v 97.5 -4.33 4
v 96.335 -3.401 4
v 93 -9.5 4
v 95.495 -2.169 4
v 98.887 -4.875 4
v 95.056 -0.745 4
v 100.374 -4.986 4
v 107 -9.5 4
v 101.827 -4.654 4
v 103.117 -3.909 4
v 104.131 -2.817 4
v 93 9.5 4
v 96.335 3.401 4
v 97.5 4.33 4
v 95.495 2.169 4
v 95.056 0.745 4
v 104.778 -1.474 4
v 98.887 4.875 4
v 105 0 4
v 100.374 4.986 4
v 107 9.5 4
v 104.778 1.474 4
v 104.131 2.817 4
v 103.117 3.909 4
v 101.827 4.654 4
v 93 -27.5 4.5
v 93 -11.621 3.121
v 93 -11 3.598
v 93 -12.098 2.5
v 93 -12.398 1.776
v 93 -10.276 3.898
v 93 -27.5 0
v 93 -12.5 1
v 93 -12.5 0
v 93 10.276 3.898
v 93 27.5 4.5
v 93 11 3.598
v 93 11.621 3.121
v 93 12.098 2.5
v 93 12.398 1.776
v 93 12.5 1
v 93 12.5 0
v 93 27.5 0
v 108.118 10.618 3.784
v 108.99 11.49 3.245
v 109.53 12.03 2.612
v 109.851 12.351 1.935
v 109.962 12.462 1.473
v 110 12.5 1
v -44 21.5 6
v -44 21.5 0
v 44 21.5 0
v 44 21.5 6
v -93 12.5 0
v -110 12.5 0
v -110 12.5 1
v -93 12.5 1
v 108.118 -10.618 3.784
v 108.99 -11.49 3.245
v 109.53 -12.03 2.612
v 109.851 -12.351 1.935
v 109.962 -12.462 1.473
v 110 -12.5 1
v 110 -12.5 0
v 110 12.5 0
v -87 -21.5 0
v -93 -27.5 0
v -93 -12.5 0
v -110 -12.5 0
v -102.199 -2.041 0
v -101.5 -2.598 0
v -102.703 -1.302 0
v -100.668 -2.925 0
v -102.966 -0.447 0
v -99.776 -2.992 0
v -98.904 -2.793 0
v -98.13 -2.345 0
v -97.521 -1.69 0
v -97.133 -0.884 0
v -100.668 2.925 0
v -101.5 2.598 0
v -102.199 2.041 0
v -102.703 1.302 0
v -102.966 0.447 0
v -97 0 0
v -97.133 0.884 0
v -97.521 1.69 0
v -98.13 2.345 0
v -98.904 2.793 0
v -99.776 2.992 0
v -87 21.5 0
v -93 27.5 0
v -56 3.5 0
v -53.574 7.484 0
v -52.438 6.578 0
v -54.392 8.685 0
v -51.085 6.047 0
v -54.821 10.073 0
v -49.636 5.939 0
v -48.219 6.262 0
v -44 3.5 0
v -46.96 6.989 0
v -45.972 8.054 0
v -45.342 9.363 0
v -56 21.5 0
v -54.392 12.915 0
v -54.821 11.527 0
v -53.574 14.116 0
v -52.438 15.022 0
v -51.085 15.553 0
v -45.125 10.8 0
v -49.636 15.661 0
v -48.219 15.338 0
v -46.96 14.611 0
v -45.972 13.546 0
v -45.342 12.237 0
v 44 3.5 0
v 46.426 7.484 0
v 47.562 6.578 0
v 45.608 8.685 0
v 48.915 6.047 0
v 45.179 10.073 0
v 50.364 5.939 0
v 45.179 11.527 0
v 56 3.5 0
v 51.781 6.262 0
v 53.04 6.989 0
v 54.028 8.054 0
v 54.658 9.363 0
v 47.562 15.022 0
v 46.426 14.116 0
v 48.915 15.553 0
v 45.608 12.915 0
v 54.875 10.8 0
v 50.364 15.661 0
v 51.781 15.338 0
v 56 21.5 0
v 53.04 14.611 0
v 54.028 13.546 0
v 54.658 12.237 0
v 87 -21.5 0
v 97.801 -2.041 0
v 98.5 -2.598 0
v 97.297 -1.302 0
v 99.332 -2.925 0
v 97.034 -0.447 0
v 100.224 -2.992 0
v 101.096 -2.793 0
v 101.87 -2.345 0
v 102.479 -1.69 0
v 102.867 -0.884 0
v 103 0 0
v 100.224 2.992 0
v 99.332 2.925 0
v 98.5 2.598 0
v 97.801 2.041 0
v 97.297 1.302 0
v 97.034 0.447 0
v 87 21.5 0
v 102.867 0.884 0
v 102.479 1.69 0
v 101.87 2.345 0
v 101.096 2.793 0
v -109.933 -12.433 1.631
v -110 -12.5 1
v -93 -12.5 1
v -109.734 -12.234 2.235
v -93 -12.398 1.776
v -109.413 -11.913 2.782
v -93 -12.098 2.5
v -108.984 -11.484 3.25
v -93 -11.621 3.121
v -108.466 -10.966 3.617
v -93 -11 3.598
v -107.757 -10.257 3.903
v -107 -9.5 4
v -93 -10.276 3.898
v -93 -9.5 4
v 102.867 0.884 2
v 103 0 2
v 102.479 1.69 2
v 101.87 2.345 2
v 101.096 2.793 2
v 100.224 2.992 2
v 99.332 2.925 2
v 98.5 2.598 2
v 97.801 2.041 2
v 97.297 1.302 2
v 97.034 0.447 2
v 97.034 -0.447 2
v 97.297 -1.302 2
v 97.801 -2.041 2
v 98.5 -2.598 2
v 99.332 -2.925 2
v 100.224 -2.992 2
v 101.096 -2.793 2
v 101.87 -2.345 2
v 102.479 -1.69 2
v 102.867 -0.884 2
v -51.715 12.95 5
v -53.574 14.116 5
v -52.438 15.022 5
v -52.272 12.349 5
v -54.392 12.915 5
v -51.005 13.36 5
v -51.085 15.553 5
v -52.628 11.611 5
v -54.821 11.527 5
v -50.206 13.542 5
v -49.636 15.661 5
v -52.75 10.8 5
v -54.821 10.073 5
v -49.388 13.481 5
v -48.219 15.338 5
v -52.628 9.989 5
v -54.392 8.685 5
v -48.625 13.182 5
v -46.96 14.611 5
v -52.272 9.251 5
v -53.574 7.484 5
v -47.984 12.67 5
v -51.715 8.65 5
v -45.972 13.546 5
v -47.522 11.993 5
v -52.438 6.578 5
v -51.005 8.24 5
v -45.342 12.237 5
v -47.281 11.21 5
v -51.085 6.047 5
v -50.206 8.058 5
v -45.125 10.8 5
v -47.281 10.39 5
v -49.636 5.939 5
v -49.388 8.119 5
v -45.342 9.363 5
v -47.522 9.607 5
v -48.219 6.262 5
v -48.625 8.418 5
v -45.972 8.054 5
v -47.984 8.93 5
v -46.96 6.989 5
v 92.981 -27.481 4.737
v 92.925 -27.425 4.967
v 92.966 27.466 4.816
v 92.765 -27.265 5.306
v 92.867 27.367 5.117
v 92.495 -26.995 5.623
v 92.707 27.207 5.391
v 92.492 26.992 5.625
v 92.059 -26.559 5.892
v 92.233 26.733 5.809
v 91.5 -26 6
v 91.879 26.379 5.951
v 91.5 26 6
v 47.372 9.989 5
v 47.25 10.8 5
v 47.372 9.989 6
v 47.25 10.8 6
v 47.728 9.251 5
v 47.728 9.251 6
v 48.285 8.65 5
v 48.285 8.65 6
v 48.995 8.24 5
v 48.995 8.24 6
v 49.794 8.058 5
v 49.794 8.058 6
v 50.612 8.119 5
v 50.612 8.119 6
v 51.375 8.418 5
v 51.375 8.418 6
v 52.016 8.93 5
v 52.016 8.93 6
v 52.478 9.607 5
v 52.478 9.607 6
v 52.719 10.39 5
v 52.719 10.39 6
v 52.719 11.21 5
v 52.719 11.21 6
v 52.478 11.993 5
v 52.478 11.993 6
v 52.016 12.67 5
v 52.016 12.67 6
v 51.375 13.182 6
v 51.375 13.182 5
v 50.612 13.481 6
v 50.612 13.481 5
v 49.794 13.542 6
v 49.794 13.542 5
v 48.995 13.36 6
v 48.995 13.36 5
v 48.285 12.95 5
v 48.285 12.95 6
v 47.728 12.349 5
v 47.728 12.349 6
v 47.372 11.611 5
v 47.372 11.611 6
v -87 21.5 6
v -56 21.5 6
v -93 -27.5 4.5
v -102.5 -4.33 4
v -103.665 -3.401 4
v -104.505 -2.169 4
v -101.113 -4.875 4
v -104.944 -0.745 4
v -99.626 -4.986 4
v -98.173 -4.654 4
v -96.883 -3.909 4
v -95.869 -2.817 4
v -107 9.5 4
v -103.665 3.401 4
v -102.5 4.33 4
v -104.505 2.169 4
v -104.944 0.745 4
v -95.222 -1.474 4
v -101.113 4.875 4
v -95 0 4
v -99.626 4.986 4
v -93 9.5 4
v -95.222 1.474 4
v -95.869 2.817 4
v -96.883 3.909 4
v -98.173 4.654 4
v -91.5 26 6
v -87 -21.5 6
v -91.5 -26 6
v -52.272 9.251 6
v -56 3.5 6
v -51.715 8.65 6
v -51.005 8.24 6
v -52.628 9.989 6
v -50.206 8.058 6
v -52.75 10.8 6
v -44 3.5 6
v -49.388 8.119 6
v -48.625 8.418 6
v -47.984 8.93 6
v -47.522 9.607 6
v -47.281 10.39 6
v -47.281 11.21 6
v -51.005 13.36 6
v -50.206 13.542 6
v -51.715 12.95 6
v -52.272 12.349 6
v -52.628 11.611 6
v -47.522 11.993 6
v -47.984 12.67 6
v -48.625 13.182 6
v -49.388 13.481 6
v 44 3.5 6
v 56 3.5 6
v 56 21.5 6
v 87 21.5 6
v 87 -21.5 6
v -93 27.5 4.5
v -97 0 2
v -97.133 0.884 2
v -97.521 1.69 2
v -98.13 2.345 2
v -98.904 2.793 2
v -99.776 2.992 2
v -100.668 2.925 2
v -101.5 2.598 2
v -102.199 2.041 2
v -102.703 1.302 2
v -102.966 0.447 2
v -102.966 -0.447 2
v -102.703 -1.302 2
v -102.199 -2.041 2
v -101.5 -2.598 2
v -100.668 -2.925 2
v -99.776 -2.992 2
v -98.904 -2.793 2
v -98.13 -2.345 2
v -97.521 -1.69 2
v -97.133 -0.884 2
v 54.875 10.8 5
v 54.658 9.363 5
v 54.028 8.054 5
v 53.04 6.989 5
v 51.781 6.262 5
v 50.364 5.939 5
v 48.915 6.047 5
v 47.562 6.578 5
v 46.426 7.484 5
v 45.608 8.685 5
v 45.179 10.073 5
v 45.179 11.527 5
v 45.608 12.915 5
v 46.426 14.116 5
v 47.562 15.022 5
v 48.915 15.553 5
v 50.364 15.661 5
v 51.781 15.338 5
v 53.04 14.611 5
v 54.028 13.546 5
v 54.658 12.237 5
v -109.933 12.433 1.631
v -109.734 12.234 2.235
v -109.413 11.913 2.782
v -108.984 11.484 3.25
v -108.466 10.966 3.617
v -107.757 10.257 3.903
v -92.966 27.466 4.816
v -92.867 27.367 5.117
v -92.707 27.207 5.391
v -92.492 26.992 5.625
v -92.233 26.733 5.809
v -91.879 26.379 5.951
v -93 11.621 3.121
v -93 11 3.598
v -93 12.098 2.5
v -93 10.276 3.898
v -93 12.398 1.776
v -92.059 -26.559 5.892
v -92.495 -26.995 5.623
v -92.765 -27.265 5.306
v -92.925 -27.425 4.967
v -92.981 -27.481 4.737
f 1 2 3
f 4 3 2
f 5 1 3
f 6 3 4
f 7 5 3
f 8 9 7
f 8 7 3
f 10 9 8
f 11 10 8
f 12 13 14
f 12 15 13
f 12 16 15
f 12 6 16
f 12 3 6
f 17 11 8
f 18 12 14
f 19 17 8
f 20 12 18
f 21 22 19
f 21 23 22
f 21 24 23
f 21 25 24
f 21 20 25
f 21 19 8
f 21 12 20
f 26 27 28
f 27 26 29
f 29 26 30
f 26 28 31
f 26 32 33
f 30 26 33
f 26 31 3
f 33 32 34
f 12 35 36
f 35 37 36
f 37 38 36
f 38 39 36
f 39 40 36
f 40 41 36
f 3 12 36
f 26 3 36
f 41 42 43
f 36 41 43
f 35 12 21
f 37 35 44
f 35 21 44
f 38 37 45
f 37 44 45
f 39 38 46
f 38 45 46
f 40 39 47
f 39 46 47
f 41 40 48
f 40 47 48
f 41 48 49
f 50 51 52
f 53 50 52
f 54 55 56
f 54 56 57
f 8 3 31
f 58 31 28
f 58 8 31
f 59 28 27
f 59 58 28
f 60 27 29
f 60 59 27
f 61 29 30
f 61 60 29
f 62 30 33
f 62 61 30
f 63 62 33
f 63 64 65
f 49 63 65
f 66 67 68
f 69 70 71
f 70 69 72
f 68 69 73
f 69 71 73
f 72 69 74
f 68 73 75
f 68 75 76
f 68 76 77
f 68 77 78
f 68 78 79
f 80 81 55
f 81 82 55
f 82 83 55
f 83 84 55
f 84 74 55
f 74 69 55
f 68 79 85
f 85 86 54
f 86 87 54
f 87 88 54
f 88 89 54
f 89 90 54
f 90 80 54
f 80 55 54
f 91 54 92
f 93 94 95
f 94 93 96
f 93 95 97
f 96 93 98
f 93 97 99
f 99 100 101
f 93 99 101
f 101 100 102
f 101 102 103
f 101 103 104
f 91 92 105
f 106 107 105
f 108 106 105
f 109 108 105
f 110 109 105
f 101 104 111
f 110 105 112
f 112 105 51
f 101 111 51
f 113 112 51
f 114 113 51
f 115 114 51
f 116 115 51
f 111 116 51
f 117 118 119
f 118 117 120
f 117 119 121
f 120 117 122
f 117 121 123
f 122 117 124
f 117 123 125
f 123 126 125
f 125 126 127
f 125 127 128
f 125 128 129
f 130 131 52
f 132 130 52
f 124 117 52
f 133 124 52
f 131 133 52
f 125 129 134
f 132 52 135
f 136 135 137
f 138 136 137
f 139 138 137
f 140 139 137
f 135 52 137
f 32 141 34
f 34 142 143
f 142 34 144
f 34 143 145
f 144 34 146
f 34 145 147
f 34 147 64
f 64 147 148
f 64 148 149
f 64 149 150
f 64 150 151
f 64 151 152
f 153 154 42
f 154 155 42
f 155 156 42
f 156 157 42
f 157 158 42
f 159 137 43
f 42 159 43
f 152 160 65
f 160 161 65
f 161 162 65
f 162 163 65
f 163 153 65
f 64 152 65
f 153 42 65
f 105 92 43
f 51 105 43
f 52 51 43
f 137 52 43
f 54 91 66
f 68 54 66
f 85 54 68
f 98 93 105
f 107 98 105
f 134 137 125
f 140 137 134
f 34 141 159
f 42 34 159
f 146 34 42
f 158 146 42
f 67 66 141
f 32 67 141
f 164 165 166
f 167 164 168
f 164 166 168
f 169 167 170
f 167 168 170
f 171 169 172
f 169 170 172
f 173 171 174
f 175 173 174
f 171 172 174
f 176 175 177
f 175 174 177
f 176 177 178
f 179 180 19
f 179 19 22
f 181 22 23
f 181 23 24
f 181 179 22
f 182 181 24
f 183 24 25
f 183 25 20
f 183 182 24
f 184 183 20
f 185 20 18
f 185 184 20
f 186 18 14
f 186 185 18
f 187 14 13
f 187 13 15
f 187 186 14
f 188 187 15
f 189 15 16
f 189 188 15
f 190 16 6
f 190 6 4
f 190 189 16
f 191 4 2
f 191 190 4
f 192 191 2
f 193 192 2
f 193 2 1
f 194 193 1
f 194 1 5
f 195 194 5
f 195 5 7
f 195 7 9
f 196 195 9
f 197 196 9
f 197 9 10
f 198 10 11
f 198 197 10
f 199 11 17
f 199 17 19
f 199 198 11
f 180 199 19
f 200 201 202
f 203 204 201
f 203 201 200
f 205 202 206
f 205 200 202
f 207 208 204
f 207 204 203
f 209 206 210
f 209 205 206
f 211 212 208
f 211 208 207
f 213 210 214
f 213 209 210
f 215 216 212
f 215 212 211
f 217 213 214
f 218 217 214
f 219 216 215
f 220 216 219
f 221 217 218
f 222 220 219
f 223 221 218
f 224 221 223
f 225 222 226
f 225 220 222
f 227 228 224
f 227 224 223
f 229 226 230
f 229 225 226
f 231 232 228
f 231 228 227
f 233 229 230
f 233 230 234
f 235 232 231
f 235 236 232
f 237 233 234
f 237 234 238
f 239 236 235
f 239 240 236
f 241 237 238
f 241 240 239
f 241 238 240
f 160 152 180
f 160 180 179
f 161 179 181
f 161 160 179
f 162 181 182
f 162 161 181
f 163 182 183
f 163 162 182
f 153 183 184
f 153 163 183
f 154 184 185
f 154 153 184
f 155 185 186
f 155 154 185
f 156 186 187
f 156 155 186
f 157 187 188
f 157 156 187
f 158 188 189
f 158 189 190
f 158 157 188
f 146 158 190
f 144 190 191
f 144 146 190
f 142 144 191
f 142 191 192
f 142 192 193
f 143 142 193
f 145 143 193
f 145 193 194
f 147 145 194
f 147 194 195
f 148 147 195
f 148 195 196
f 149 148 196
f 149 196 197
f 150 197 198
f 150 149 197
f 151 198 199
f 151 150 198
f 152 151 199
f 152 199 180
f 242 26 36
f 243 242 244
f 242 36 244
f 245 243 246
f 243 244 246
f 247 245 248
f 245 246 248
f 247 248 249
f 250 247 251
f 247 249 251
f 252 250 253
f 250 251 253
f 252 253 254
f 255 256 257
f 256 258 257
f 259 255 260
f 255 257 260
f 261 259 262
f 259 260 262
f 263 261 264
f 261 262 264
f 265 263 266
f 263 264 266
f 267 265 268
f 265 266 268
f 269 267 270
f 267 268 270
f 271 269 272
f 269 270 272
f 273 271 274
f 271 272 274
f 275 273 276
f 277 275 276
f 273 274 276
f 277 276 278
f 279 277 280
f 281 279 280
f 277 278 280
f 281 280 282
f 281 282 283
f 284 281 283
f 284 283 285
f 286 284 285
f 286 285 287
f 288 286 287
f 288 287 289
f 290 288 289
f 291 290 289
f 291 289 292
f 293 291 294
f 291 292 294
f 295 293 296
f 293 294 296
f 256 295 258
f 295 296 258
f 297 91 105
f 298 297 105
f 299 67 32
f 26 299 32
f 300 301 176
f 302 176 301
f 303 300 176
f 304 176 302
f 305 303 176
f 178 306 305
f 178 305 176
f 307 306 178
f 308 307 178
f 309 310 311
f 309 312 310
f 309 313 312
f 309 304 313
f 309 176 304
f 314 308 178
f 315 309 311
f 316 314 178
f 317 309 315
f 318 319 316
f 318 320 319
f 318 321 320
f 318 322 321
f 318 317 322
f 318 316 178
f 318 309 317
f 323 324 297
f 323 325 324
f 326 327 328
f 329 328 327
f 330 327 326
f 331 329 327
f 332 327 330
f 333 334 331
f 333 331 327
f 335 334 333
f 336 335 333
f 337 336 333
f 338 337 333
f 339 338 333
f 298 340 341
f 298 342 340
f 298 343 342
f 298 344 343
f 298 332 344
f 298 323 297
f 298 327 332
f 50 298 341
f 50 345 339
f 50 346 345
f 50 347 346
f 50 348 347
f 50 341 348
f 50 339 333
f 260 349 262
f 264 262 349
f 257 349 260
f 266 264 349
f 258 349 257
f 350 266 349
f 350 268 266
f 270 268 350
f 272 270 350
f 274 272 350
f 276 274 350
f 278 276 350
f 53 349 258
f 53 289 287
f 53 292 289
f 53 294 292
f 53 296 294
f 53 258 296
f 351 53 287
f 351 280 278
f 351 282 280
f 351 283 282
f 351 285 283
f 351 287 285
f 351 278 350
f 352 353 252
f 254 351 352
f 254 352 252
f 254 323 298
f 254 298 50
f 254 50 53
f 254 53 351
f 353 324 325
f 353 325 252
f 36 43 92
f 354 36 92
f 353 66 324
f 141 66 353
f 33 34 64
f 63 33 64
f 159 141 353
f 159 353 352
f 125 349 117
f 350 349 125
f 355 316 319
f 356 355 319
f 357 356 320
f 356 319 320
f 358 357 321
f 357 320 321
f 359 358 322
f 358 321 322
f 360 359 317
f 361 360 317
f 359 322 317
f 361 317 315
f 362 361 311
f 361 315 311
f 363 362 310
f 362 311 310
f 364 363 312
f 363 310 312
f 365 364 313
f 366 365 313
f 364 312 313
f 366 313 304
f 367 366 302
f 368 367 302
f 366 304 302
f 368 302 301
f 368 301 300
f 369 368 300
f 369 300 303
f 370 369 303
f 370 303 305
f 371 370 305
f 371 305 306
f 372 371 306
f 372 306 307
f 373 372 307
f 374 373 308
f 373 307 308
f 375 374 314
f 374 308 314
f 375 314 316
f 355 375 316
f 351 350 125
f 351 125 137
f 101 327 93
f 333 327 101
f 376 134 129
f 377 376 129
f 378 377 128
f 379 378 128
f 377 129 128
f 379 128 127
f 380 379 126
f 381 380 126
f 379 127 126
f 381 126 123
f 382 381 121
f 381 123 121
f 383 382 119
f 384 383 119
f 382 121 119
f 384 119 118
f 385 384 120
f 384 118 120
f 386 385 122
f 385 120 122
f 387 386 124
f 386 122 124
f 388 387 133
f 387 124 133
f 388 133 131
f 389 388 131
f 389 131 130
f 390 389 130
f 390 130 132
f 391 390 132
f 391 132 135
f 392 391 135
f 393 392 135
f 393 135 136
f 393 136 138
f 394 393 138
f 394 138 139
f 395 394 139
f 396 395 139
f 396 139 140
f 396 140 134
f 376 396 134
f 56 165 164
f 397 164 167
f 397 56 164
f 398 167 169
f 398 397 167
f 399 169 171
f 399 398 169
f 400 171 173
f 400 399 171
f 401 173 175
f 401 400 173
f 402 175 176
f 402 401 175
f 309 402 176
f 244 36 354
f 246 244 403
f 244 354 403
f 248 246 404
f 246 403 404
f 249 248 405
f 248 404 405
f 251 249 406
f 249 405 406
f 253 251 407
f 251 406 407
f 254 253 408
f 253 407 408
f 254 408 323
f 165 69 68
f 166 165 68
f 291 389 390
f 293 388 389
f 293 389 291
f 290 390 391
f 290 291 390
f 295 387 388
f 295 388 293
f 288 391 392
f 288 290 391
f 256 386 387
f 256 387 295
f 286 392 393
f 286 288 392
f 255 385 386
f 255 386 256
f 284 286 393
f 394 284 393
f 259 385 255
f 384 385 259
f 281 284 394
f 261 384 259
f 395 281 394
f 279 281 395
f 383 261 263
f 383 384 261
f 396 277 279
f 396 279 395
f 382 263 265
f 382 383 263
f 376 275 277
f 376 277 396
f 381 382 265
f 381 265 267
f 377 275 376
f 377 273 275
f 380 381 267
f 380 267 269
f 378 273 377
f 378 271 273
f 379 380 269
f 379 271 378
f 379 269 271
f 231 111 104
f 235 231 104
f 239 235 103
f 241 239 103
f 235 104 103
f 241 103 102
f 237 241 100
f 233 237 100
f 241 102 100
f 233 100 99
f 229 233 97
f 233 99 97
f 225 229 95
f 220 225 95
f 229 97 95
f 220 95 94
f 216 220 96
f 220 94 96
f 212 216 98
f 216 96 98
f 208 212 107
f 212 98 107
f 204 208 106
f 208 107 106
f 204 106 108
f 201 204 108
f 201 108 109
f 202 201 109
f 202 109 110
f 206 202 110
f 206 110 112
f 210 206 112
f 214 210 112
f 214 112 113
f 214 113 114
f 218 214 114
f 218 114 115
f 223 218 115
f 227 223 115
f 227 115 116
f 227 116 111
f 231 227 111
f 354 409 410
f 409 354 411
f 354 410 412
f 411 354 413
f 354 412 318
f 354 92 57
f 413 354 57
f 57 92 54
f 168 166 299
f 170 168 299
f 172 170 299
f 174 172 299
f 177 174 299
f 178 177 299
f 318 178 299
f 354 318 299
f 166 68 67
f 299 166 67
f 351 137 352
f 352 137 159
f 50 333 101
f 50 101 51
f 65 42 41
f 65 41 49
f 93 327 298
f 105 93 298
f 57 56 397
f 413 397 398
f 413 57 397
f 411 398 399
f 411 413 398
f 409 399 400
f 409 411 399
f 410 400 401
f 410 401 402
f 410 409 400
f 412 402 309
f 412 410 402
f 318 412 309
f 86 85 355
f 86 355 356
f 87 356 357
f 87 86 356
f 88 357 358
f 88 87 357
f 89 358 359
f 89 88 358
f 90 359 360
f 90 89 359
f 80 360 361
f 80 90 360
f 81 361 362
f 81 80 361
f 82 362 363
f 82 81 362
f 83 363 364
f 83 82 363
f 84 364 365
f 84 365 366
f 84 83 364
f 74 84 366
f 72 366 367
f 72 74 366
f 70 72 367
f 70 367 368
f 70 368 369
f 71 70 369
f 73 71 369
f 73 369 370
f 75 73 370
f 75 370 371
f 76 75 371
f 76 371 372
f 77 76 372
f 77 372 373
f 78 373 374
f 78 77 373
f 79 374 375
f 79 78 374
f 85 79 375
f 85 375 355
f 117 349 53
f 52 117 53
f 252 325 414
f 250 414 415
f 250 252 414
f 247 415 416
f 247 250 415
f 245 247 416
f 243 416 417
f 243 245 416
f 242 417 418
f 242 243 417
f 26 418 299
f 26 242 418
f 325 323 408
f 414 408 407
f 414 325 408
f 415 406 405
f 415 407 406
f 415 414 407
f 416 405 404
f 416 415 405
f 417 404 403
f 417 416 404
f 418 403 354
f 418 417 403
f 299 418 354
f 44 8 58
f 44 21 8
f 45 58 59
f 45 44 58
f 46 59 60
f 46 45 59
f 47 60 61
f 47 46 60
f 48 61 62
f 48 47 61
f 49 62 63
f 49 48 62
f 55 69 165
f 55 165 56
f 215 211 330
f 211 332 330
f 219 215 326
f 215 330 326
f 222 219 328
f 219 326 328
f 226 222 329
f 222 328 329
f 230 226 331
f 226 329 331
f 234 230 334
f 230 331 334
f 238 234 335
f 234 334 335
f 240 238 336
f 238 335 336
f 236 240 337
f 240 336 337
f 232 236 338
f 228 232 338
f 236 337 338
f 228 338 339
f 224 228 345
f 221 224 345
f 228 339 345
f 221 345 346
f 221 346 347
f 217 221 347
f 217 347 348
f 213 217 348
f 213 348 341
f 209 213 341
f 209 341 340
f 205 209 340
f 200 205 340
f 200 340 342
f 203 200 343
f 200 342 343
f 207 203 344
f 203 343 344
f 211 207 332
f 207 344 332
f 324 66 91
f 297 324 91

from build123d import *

# Parameters (mm, degrees)
F0_W           = 174.0000014603
F0_H           = 43.0000014603
F1_DEPTH       = 6
F0_W_2         = 17
F0_H_2         = 25
F0_R           = 3
F2_DEPTH       = 4
F3_W           = 12
F3_H           = 18
F4_DEPTH       = 6
F5_D           = 5.5
F5_CBORE_D     = 9.75
F5_CBORE_DEPTH = 5
F6_SIZE        = 2
F7_R           = 3
F8_R           = 1.5


with BuildPart() as f1:
    # F0 (on Top) → F1 (new body)
    with BuildSketch(Plane.XY):
        Polygon((93, -12.5), (93, 12.5), (93, 27.5), (-93, 27.5), (-93, 12.5), (-93, -12.5), (-93, -27.5), (93, -27.5), align=None)
        Rectangle(F0_W, F0_H, mode=Mode.SUBTRACT)
    extrude(amount=F1_DEPTH)

    # F0 (on Top) → F2 (join)
    with BuildSketch(Plane.XY):
        with Locations((101.5, 0)):
            Rectangle(F0_W_2, F0_H_2)
        with Locations((100, 0)):
            Circle(F0_R, mode=Mode.SUBTRACT)
        Polygon((93, -12.5), (93, 12.5), (93, 27.5), (-93, 27.5), (-93, 12.5), (-93, -12.5), (-93, -27.5), (93, -27.5), align=None)
        Rectangle(F0_W, F0_H, mode=Mode.SUBTRACT)
        with Locations((-101.5, 0)):
            Rectangle(F0_W_2, F0_H_2)
        with Locations((-100, 0)):
            Circle(F0_R, mode=Mode.SUBTRACT)
    extrude(amount=F2_DEPTH)

    # F3 (on face) → F4 (join)
    with BuildSketch(Plane.XY.offset(6)):
        with Locations((-50, 12.5000007302)):
            Rectangle(F3_W, F3_H)
        with Locations((50, 12.5000007302)):
            Rectangle(F3_W, F3_H)
    extrude(amount=-F4_DEPTH)

    # F5 (through all)
    with Locations(Plane(origin=(0, 0, 0), x_dir=(1, 0, 0), z_dir=(0, 0, -1))):
        with Locations((-50, -10.8), (50, -10.8)):
            CounterBoreHole(F5_D / 2, F5_CBORE_D / 2, F5_CBORE_DEPTH)

    # F6
    f6_edges = [f1.edges().sort_by_distance(p)[0] for p in [
        (97, 0, 4),
        (-103, 0, 4),
    ]]
    chamfer(f6_edges, length=F6_SIZE)

    # F7
    f7_edges = [f1.edges().sort_by_distance(p)[0] for p in [
        (-110, 0, 4),
        (-101.5, 12.5, 4),
        (-101.5, -12.5, 4),
        (101.5, 12.5, 4),
        (110, 0, 4),
        (101.5, -12.5, 4),
    ]]
    fillet(f7_edges, radius=F7_R)

    # F8
    f8_edges = [f1.edges().sort_by_distance(p)[0] for p in [
        (0, 27.5, 6),
        (-93, 0, 6),
        (0, -27.5, 6),
        (93, 0, 6),
    ]]
    fillet(f8_edges, radius=F8_R)


solid = f1.part
